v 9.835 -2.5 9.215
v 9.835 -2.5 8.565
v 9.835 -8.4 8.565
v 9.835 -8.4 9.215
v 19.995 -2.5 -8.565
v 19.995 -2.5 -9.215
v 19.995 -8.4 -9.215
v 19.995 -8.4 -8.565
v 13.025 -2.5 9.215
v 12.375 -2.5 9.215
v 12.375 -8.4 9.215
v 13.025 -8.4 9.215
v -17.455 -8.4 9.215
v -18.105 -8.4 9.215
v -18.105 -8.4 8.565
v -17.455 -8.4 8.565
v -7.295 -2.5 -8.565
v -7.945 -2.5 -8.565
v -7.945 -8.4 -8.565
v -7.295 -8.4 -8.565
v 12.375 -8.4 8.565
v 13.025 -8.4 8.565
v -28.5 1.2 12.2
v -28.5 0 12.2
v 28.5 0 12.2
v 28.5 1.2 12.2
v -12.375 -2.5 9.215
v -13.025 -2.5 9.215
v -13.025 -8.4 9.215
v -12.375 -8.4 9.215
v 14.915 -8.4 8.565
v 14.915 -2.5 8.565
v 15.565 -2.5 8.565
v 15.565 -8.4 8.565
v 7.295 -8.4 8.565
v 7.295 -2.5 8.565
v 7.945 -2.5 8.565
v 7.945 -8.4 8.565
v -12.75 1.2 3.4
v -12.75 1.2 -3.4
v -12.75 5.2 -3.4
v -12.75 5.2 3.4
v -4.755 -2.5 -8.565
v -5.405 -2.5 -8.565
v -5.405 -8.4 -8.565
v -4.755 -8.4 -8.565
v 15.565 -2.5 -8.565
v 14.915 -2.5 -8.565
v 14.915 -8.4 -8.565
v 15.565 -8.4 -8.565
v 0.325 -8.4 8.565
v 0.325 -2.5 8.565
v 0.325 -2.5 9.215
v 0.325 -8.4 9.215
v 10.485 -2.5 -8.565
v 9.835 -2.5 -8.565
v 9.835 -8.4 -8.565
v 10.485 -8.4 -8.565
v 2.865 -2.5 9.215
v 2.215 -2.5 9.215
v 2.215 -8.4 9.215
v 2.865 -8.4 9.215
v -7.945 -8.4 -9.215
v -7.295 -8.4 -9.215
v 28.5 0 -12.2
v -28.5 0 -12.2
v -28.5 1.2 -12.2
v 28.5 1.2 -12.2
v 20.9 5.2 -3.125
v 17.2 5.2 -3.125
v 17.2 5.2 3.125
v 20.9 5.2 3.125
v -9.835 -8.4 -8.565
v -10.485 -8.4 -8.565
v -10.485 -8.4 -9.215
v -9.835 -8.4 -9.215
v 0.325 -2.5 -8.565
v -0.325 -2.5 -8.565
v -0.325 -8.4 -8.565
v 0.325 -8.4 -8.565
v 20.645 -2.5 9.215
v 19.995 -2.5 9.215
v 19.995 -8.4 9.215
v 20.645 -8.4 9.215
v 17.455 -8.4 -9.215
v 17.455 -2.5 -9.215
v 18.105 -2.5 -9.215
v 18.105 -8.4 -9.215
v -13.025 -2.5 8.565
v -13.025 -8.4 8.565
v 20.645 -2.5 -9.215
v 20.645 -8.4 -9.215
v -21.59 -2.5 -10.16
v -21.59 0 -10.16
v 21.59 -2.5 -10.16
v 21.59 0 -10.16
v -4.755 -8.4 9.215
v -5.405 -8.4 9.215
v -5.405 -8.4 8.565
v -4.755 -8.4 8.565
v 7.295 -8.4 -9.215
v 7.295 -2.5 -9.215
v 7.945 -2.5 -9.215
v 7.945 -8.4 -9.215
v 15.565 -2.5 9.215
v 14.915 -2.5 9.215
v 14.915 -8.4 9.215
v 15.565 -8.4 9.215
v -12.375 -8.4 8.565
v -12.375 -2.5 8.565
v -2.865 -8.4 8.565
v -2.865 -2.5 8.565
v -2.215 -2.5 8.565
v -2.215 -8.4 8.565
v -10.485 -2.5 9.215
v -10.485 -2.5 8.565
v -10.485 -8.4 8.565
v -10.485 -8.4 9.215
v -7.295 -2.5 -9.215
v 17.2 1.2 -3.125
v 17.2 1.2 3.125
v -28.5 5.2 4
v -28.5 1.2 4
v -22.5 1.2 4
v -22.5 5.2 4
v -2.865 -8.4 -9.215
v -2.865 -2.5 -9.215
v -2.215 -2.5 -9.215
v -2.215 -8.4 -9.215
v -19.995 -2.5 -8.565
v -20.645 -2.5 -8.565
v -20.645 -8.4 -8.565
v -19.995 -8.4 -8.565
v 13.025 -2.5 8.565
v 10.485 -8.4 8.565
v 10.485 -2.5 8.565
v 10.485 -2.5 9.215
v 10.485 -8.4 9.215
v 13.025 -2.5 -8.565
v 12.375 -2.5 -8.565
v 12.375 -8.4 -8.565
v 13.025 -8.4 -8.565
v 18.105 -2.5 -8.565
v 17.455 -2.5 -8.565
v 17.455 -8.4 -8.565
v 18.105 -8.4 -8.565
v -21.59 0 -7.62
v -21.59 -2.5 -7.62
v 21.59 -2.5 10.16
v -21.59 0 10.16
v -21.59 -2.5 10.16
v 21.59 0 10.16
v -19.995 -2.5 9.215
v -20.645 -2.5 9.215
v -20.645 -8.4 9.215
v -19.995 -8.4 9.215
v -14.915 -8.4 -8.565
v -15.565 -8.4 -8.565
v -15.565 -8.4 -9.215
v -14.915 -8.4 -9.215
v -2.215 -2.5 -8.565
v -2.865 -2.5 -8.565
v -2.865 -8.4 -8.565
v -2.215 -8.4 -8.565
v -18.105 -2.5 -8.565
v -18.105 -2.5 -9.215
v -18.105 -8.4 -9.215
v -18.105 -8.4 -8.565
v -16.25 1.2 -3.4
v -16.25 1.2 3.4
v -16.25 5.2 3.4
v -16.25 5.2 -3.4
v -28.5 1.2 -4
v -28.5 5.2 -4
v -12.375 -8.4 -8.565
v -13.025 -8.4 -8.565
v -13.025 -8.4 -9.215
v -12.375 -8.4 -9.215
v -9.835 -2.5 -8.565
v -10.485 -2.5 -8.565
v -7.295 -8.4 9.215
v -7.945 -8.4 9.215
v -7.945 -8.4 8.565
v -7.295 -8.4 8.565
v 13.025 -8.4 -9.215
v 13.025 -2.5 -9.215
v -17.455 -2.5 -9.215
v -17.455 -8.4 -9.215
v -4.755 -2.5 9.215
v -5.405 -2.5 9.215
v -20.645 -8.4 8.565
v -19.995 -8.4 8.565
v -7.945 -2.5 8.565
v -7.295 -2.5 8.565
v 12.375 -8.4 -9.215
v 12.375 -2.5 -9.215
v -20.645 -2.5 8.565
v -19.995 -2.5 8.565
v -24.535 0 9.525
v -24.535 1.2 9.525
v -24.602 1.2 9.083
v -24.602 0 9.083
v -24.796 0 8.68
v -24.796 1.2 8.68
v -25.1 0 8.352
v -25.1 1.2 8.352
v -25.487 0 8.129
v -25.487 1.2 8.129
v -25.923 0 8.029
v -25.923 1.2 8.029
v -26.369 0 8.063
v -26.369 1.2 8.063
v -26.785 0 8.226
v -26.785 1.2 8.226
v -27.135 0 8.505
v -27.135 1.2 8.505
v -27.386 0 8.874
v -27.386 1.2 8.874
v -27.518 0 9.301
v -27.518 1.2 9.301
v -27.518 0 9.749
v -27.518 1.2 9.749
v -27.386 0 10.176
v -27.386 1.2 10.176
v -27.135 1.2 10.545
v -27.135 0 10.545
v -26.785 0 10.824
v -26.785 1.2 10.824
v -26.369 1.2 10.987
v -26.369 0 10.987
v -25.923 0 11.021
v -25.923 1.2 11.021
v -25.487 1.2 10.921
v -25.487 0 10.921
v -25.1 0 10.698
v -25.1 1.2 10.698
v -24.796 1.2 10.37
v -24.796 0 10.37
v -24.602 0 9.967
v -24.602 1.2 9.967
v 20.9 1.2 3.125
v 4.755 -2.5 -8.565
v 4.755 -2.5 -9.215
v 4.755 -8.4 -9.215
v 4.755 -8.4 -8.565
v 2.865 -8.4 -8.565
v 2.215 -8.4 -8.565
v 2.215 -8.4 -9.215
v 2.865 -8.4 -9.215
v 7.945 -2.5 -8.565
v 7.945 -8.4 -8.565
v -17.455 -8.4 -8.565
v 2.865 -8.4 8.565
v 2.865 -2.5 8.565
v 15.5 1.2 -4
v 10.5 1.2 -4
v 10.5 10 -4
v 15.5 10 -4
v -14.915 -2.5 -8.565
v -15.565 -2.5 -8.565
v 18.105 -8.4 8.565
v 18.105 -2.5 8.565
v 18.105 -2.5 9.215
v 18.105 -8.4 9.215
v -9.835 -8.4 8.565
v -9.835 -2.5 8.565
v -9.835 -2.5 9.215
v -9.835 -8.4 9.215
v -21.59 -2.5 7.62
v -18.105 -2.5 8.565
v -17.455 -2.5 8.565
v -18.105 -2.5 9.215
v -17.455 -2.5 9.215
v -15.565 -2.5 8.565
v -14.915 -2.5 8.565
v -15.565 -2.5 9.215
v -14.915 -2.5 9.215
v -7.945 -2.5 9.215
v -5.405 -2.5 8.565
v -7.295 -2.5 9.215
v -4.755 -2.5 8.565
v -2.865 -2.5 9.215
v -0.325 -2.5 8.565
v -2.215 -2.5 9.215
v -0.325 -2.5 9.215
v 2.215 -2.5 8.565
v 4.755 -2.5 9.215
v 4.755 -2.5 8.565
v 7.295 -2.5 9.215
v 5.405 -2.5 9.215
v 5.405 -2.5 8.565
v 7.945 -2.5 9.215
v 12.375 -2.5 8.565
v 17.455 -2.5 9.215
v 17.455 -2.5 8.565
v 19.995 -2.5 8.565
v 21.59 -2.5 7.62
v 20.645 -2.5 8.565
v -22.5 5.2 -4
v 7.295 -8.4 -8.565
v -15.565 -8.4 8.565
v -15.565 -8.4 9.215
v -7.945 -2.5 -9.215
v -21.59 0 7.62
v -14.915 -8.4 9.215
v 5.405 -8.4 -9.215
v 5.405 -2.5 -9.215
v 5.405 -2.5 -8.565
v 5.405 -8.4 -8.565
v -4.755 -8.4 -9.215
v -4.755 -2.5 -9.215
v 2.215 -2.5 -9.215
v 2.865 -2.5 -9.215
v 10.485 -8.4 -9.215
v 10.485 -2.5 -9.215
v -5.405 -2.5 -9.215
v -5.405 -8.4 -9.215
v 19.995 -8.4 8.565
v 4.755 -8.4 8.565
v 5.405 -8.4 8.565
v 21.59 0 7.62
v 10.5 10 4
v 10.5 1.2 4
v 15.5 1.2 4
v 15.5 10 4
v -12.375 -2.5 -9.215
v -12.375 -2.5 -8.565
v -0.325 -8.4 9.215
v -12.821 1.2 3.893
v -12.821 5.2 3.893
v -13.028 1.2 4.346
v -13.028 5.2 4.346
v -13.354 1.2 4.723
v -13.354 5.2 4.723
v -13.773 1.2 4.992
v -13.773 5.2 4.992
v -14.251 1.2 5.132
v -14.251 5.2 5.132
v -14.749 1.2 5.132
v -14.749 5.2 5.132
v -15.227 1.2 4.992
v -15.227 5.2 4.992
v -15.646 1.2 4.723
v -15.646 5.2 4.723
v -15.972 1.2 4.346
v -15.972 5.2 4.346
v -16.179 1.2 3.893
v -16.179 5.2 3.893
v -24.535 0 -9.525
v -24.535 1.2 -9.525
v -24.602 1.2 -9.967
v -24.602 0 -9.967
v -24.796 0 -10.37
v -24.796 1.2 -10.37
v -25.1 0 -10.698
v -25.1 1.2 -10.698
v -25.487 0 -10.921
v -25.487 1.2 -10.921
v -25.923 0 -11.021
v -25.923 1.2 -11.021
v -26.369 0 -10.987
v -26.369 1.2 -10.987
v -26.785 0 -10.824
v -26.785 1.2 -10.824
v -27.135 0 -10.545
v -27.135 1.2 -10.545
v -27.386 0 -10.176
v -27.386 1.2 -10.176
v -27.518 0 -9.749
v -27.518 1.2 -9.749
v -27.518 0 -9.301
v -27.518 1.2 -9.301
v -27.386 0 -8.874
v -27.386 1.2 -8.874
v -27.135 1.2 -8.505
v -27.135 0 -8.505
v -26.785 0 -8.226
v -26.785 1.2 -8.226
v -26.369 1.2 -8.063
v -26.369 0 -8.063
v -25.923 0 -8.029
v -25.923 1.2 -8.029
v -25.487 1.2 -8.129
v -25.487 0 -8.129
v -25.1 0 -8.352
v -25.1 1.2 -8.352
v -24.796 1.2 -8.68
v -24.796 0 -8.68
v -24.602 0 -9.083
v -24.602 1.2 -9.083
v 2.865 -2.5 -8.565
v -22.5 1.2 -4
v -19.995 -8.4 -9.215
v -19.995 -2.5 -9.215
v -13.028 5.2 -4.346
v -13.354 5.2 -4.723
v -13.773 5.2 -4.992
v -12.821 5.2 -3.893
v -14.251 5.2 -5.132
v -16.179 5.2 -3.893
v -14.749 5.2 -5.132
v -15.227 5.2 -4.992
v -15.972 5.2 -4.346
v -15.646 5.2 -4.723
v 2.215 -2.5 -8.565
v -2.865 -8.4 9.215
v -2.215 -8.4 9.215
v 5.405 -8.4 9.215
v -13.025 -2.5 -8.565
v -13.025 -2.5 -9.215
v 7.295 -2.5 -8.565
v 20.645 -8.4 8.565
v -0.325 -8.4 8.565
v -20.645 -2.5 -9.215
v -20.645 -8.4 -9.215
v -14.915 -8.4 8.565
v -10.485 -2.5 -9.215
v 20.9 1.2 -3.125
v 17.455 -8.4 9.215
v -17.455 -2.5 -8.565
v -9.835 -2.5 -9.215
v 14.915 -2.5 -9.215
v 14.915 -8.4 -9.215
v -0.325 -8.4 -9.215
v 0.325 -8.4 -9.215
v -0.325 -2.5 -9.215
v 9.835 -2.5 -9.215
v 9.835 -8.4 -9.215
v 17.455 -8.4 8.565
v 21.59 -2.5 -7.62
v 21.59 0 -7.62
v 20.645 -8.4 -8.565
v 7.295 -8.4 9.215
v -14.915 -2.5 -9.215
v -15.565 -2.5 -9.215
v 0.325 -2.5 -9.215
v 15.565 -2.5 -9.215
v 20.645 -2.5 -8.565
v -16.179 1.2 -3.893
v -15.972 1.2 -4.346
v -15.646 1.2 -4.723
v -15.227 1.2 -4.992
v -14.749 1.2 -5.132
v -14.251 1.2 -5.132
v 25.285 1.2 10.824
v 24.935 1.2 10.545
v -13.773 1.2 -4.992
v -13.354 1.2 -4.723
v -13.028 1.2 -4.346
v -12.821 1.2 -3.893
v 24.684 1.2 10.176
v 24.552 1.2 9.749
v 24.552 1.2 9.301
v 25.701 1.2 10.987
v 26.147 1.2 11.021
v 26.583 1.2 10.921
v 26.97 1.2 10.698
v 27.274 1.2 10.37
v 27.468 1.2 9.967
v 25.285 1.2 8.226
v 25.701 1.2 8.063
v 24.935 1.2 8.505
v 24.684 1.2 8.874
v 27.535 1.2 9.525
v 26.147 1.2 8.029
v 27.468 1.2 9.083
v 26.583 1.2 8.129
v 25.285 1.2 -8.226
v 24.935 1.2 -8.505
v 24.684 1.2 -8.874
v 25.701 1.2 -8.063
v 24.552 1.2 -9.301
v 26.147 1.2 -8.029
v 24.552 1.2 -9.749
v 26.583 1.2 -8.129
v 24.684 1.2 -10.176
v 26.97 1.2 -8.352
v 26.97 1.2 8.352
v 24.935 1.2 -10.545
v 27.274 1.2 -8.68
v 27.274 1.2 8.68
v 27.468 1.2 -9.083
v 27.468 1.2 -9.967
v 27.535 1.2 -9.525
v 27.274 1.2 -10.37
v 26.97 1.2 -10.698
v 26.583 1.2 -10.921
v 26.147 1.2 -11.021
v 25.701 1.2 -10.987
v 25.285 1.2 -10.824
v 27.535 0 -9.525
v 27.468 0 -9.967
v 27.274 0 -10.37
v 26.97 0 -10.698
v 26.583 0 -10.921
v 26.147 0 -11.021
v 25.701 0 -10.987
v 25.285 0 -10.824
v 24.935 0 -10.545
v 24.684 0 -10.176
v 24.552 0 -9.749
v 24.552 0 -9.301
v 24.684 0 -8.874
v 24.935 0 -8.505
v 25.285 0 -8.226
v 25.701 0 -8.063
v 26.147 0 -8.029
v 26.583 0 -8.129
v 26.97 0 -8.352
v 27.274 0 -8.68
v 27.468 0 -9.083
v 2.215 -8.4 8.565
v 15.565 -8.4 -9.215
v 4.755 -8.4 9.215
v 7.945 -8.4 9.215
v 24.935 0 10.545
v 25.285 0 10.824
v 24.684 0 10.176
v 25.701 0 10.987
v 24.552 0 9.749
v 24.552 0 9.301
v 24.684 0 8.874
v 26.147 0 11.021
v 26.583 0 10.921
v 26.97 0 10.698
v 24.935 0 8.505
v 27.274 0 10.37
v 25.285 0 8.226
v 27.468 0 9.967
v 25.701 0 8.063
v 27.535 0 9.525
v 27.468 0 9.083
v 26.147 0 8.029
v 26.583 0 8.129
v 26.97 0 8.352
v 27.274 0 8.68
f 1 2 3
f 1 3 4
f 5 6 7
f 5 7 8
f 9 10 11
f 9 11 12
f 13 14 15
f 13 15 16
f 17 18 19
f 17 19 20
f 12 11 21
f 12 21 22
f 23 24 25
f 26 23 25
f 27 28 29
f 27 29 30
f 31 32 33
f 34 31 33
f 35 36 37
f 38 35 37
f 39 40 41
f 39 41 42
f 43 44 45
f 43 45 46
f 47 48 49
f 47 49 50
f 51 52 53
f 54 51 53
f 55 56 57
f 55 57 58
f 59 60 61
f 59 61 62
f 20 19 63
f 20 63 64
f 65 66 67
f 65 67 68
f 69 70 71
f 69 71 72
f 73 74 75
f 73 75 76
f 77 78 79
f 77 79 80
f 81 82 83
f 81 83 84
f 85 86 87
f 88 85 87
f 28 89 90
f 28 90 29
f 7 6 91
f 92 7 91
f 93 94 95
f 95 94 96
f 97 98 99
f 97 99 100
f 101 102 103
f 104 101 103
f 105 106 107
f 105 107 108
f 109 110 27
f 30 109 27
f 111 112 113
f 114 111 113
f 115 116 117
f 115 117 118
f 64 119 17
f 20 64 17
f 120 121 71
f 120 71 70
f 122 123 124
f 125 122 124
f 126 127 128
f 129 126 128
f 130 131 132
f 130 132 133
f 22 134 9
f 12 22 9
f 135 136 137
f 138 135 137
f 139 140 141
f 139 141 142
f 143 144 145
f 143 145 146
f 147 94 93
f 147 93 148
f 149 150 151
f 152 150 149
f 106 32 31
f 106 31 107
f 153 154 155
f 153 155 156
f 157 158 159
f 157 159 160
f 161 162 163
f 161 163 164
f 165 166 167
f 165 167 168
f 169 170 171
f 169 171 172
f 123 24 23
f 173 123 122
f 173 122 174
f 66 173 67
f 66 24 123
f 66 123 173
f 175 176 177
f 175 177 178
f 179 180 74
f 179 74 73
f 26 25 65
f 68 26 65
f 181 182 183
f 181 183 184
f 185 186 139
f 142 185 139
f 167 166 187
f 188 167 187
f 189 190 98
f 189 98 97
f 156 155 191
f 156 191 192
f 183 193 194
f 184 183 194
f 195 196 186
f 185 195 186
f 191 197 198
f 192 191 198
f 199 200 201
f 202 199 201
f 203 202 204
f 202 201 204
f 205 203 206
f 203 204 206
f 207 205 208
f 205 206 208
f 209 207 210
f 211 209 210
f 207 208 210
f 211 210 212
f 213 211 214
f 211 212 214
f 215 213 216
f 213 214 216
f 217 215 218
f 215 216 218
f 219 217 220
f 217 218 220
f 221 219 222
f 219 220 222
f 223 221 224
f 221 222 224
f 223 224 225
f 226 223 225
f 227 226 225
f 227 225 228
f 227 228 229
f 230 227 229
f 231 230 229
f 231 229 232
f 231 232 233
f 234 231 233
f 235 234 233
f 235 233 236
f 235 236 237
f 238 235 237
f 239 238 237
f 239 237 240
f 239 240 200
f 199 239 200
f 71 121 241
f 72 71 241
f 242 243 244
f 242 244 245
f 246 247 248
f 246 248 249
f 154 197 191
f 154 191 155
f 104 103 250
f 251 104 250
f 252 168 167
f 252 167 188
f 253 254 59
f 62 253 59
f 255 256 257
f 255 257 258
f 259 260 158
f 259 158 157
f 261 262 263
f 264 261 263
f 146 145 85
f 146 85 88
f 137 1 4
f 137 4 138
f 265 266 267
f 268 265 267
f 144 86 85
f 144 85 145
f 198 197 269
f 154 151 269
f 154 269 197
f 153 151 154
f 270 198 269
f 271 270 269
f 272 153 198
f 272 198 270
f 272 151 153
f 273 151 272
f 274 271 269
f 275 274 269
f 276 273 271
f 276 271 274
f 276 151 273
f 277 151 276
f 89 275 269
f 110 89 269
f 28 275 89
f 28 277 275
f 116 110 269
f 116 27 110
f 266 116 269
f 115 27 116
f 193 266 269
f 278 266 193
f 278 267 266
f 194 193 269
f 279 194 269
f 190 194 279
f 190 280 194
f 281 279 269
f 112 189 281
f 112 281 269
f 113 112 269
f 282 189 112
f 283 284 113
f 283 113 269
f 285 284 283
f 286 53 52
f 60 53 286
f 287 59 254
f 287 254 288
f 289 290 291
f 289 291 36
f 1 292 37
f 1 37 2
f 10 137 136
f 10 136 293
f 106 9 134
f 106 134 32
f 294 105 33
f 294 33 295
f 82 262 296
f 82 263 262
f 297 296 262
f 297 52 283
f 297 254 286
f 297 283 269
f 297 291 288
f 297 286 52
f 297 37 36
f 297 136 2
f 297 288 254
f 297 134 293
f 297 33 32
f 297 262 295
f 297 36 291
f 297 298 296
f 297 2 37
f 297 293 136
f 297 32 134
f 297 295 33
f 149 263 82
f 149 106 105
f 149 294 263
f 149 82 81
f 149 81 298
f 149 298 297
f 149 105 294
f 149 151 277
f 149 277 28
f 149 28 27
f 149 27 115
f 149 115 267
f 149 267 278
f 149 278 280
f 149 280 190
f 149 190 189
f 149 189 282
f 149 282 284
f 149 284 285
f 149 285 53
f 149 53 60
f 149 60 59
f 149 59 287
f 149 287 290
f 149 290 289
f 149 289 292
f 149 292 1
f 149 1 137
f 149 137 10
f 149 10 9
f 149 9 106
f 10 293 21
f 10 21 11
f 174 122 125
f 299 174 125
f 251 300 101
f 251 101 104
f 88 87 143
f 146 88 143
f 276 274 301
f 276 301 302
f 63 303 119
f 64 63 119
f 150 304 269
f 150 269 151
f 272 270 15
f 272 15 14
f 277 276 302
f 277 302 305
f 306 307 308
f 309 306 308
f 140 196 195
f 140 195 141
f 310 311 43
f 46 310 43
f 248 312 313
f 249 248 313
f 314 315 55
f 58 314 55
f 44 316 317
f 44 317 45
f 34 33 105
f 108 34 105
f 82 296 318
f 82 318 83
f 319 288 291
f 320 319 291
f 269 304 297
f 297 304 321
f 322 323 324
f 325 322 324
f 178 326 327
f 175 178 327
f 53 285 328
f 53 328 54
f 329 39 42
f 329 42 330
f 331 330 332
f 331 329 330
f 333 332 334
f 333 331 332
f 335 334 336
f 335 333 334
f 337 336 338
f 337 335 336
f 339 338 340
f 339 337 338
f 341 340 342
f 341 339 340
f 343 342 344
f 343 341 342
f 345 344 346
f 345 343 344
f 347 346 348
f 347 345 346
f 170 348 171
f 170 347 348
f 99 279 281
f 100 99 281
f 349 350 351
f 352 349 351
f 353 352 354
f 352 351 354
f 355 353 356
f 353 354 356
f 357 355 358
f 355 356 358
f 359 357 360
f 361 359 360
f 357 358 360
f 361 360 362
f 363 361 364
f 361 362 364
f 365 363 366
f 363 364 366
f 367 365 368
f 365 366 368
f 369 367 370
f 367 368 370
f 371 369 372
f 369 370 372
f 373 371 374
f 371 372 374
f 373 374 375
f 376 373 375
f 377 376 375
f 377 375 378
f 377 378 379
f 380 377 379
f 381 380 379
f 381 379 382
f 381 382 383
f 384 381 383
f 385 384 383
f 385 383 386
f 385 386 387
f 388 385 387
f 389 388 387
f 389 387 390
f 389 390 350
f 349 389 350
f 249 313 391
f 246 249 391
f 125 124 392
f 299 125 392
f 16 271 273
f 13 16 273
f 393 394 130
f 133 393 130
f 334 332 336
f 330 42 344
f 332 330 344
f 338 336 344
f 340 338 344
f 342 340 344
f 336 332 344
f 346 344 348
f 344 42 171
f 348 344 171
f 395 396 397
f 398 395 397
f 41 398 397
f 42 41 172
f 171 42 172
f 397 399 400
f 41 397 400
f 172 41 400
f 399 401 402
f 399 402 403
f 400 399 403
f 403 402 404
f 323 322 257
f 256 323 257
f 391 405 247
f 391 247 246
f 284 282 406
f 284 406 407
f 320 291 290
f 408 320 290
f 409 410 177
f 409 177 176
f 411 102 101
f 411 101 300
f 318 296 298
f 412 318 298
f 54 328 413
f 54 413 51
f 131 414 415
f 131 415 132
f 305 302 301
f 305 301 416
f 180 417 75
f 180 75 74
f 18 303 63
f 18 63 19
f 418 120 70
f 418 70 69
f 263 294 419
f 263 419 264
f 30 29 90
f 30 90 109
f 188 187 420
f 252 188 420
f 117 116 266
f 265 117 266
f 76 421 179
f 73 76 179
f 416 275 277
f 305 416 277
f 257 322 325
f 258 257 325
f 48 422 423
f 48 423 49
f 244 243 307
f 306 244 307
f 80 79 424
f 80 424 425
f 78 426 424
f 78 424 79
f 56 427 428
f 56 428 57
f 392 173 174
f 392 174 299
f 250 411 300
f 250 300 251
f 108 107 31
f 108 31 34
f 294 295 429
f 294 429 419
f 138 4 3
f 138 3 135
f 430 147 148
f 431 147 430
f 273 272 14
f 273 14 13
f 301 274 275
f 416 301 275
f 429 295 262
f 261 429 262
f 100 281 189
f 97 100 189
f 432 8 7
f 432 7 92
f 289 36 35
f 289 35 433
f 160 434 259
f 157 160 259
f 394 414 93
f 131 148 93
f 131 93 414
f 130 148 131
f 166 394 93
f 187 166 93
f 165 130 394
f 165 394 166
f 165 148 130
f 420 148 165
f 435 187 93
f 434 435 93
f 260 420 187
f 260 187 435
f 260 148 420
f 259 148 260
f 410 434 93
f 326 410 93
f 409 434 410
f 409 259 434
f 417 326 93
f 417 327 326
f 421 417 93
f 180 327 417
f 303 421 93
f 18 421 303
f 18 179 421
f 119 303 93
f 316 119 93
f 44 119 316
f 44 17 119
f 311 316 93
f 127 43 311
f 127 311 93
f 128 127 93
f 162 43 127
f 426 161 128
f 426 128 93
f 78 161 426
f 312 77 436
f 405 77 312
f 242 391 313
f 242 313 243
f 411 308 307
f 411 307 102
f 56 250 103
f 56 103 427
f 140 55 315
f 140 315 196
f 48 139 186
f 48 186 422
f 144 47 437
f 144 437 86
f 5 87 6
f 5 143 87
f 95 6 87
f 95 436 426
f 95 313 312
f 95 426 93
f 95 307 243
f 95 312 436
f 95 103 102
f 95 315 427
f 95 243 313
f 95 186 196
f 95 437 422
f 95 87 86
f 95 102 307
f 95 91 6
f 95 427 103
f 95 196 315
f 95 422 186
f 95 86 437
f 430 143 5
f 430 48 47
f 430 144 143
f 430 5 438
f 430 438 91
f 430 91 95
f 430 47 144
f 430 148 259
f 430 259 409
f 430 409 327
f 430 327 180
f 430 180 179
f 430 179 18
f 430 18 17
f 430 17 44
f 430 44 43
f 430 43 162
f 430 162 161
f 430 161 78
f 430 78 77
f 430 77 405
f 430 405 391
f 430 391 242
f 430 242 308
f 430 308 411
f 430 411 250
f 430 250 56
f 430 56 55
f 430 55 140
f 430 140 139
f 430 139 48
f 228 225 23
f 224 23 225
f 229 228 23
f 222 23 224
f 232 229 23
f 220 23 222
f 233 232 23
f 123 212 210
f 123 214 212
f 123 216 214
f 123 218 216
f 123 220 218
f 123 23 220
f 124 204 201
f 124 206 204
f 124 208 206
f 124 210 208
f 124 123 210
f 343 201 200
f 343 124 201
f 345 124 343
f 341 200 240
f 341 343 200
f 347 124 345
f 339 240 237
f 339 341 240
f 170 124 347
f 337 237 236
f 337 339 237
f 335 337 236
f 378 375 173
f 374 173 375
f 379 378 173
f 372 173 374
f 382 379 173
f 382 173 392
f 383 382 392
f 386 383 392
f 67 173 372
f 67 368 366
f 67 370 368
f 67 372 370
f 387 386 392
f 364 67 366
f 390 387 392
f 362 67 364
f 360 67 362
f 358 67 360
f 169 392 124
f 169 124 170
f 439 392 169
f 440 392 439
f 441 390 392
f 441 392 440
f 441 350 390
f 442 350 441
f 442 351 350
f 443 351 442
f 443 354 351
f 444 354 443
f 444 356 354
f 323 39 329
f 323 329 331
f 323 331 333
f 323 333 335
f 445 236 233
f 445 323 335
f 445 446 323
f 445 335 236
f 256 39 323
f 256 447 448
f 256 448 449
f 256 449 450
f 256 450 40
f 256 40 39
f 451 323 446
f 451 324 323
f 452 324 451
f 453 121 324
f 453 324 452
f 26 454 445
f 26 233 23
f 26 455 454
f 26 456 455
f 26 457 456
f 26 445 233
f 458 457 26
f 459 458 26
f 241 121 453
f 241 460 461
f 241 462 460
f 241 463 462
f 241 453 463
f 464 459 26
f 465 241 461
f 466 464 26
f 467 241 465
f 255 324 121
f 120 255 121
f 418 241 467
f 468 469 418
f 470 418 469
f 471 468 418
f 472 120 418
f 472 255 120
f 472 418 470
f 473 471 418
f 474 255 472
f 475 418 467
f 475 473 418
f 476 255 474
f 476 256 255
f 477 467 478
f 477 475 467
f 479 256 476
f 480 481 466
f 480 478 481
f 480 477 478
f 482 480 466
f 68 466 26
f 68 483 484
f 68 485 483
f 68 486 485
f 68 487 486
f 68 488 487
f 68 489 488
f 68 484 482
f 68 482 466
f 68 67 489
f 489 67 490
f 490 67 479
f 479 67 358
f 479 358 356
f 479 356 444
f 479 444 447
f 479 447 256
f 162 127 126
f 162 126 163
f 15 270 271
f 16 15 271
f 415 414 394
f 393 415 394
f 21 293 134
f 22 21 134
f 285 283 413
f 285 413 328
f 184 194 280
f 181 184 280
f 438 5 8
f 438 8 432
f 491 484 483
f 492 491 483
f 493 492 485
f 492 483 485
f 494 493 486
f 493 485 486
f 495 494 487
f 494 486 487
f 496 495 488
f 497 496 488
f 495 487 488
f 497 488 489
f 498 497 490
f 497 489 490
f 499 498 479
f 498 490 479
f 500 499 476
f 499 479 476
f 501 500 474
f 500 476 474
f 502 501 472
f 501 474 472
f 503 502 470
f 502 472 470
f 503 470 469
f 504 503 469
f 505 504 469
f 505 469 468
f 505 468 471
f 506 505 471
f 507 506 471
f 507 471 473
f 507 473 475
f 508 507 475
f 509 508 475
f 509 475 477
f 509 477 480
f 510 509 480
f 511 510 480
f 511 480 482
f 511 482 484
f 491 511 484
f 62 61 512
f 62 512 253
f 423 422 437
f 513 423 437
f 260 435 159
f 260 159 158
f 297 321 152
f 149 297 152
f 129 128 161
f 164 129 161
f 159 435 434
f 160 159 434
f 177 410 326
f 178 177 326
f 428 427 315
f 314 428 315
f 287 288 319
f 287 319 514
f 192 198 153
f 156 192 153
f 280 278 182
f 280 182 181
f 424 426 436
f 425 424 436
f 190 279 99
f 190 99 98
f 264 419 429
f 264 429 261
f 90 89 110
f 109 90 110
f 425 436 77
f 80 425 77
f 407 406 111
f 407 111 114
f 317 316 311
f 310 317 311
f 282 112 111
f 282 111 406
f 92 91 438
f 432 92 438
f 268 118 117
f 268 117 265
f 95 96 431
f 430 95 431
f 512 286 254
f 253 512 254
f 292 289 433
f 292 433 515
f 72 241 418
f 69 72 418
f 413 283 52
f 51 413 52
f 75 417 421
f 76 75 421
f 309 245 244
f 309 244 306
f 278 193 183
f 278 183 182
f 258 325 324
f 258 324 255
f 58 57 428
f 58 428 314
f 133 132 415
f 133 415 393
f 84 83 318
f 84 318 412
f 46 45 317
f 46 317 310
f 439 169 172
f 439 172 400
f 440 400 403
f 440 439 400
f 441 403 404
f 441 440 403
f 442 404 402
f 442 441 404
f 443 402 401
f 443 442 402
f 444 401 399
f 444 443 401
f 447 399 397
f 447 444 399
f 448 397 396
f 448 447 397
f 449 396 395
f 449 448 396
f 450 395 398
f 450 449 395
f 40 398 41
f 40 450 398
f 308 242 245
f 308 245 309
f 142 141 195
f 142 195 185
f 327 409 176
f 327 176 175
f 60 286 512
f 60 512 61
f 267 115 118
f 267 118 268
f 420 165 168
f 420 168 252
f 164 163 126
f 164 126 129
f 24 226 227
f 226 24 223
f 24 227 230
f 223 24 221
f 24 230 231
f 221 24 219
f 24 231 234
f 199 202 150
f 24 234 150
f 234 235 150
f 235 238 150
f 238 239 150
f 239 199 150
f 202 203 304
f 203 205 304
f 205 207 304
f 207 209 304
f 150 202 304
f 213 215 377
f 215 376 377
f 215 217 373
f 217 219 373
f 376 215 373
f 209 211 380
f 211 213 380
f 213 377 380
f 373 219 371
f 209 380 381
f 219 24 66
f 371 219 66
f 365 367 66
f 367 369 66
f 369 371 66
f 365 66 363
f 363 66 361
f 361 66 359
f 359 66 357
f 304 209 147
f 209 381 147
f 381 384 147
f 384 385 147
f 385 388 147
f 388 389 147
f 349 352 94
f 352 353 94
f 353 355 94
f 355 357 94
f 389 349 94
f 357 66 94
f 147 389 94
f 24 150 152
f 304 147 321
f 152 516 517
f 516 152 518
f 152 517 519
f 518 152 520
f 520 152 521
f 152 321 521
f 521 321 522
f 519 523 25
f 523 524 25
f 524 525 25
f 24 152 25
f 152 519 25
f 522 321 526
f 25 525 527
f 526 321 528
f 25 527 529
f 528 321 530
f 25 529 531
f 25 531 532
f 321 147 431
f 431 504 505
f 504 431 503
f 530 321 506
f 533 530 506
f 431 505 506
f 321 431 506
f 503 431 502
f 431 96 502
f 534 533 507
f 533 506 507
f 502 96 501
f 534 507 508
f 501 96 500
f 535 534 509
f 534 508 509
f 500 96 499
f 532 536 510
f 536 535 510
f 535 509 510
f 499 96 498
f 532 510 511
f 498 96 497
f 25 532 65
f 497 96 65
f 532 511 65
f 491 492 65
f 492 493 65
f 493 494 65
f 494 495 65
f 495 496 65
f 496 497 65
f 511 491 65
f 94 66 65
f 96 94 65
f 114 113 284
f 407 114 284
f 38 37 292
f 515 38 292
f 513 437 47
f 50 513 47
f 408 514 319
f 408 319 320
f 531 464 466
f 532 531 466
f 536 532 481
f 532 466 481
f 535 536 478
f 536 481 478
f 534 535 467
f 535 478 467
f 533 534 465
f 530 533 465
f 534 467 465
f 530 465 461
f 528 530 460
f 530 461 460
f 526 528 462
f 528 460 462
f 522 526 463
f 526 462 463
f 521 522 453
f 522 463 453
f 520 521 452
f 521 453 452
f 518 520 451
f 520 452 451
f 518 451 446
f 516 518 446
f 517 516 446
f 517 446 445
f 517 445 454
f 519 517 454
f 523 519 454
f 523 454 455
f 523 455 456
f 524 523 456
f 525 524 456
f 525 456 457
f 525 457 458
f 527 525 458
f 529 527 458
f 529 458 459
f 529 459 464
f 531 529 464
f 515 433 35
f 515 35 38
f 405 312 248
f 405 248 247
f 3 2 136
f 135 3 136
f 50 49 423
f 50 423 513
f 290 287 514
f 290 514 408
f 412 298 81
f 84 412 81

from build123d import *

# Parameters (mm, degrees)
SKETCH1_W           = 57
SKETCH1_H           = 24.4
BOSS_EXTRUDE1_DEPTH = 1.2
SKETCH2_R           = 1.5
CUT_EXTRUDE1_DEPTH  = 2.2
SKETCH3_W           = 6
SKETCH3_H           = 8
BOSS_EXTRUDE2_DEPTH = 4
BOSS_EXTRUDE3_DEPTH = 4
SKETCH5_W           = 5
SKETCH5_H           = 8
BOSS_EXTRUDE4_DEPTH = 8.8
SKETCH6_W           = 3.7
SKETCH6_H           = 6.25
BOSS_EXTRUDE5_DEPTH = 4
SKETCH7_W           = 43.18
SKETCH7_H           = 2.54
BOSS_EXTRUDE6_DEPTH = 2.5
SKETCH8_W           = 0.65
SKETCH8_H           = 0.65
BOSS_EXTRUDE7_DEPTH = 5.9


with BuildPart() as part:
    # Sketch1 → Boss-Extrude1 (new body)
    with BuildSketch(Plane(origin=(0, 0, 0), x_dir=(1, 0, 0), z_dir=(0, 1, 0))):
        Rectangle(SKETCH1_W, SKETCH1_H)
    extrude(amount=BOSS_EXTRUDE1_DEPTH)

    # Sketch2 → Cut-Extrude1 (cut, through all)
    with BuildSketch(Plane(origin=(0, 1.2, 0), x_dir=(1, 0, 0), z_dir=(0, 1, 0))):
        with Locations((-26.035, -9.525)):
            Circle(SKETCH2_R)
        with Locations((26.035, -9.525)):
            Circle(SKETCH2_R)
        with Locations((26.035, 9.525)):
            Circle(SKETCH2_R)
        with Locations((-26.035, 9.525)):
            Circle(SKETCH2_R)
    extrude(amount=-CUT_EXTRUDE1_DEPTH, mode=Mode.SUBTRACT)

    # Sketch3 → Boss-Extrude2 (add)
    with BuildSketch(Plane(origin=(0, 1.2, 0), x_dir=(1, 0, 0), z_dir=(0, 1, 0))):
        with Locations((-25.5, 0)):
            Rectangle(SKETCH3_W, SKETCH3_H)
    extrude(amount=BOSS_EXTRUDE2_DEPTH)

    # Sketch4 → Boss-Extrude3 (add)
    with BuildSketch(Plane(origin=(0, 1.2, 0), x_dir=(1, 0, 0), z_dir=(0, 1, 0))):
        with BuildLine():
            Line((-16.25, -3.4), (-16.25, 3.4))
            ThreePointArc((-16.25, 3.4), (-14.5, 5.15), (-12.75, 3.4))
            Line((-12.75, 3.4), (-12.75, -3.4))
            ThreePointArc((-12.75, -3.4), (-14.5, -5.15), (-16.25, -3.4))
        make_face()
    extrude(amount=BOSS_EXTRUDE3_DEPTH)

    # Sketch5 → Boss-Extrude4 (add)
    with BuildSketch(Plane(origin=(0, 1.2, 0), x_dir=(1, 0, 0), z_dir=(0, 1, 0))):
        with Locations((13, 0)):
            Rectangle(SKETCH5_W, SKETCH5_H)
    extrude(amount=BOSS_EXTRUDE4_DEPTH)

    # Sketch6 → Boss-Extrude5 (add)
    with BuildSketch(Plane(origin=(0, 1.2, 0), x_dir=(1, 0, 0), z_dir=(0, 1, 0))):
        with Locations((19.05, 0)):
            Rectangle(SKETCH6_W, SKETCH6_H)
    extrude(amount=BOSS_EXTRUDE5_DEPTH)

    # Sketch7 → Boss-Extrude6 (add)
    with BuildSketch(Plane.XZ):
        with Locations((0, 8.89)):
            Rectangle(SKETCH7_W, SKETCH7_H)
        with Locations((0, -8.89)):
            Rectangle(SKETCH7_W, SKETCH7_H)
    extrude(amount=BOSS_EXTRUDE6_DEPTH)

    # Sketch8 → Boss-Extrude7 (add)
    with BuildSketch(Plane.XZ.offset(2.5)):
        with Locations((-17.78, 8.89)):
            Rectangle(SKETCH8_W, SKETCH8_H)
        with Locations((-20.32, 8.89)):
            Rectangle(SKETCH8_W, SKETCH8_H)
        with Locations((-15.24, 8.89)):
            Rectangle(SKETCH8_W, SKETCH8_H)
        with Locations((-12.7, 8.89)):
            Rectangle(SKETCH8_W, SKETCH8_H)
        with Locations((-10.16, 8.89)):
            Rectangle(SKETCH8_W, SKETCH8_H)
        with Locations((-7.62, 8.89)):
            Rectangle(SKETCH8_W, SKETCH8_H)
        with Locations((-5.08, 8.89)):
            Rectangle(SKETCH8_W, SKETCH8_H)
        with Locations((-2.54, 8.89)):
            Rectangle(SKETCH8_W, SKETCH8_H)
        with Locations((0, 8.89)):
            Rectangle(SKETCH8_W, SKETCH8_H)
        with Locations((2.54, 8.89)):
            Rectangle(SKETCH8_W, SKETCH8_H)
        with Locations((5.08, 8.89)):
            Rectangle(SKETCH8_W, SKETCH8_H)
        with Locations((7.62, 8.89)):
            Rectangle(SKETCH8_W, SKETCH8_H)
        with Locations((10.16, 8.89)):
            Rectangle(SKETCH8_W, SKETCH8_H)
        with Locations((12.7, 8.89)):
            Rectangle(SKETCH8_W, SKETCH8_H)
        with Locations((15.24, 8.89)):
            Rectangle(SKETCH8_W, SKETCH8_H)
        with Locations((17.78, 8.89)):
            Rectangle(SKETCH8_W, SKETCH8_H)
        with Locations((20.32, 8.89)):
            Rectangle(SKETCH8_W, SKETCH8_H)
        with Locations((20.32, -8.89)):
            Rectangle(SKETCH8_W, SKETCH8_H)
        with Locations((17.78, -8.89)):
            Rectangle(SKETCH8_W, SKETCH8_H)
        with Locations((15.24, -8.89)):
            Rectangle(SKETCH8_W, SKETCH8_H)
        with Locations((12.7, -8.89)):
            Rectangle(SKETCH8_W, SKETCH8_H)
        with Locations((10.16, -8.89)):
            Rectangle(SKETCH8_W, SKETCH8_H)
        with Locations((7.62, -8.89)):
            Rectangle(SKETCH8_W, SKETCH8_H)
        with Locations((5.08, -8.89)):
            Rectangle(SKETCH8_W, SKETCH8_H)
        with Locations((2.54, -8.89)):
            Rectangle(SKETCH8_W, SKETCH8_H)
        with Locations((0, -8.89)):
            Rectangle(SKETCH8_W, SKETCH8_H)
        with Locations((-2.54, -8.89)):
            Rectangle(SKETCH8_W, SKETCH8_H)
        with Locations((-5.08, -8.89)):
            Rectangle(SKETCH8_W, SKETCH8_H)
        with Locations((-7.62, -8.89)):
            Rectangle(SKETCH8_W, SKETCH8_H)
        with Locations((-10.16, -8.89)):
            Rectangle(SKETCH8_W, SKETCH8_H)
        with Locations((-12.7, -8.89)):
            Rectangle(SKETCH8_W, SKETCH8_H)
        with Locations((-15.24, -8.89)):
            Rectangle(SKETCH8_W, SKETCH8_H)
        with Locations((-17.78, -8.89)):
            Rectangle(SKETCH8_W, SKETCH8_H)
        with Locations((-20.32, -8.89)):
            Rectangle(SKETCH8_W, SKETCH8_H)
    extrude(amount=BOSS_EXTRUDE7_DEPTH)


solid = part.part
